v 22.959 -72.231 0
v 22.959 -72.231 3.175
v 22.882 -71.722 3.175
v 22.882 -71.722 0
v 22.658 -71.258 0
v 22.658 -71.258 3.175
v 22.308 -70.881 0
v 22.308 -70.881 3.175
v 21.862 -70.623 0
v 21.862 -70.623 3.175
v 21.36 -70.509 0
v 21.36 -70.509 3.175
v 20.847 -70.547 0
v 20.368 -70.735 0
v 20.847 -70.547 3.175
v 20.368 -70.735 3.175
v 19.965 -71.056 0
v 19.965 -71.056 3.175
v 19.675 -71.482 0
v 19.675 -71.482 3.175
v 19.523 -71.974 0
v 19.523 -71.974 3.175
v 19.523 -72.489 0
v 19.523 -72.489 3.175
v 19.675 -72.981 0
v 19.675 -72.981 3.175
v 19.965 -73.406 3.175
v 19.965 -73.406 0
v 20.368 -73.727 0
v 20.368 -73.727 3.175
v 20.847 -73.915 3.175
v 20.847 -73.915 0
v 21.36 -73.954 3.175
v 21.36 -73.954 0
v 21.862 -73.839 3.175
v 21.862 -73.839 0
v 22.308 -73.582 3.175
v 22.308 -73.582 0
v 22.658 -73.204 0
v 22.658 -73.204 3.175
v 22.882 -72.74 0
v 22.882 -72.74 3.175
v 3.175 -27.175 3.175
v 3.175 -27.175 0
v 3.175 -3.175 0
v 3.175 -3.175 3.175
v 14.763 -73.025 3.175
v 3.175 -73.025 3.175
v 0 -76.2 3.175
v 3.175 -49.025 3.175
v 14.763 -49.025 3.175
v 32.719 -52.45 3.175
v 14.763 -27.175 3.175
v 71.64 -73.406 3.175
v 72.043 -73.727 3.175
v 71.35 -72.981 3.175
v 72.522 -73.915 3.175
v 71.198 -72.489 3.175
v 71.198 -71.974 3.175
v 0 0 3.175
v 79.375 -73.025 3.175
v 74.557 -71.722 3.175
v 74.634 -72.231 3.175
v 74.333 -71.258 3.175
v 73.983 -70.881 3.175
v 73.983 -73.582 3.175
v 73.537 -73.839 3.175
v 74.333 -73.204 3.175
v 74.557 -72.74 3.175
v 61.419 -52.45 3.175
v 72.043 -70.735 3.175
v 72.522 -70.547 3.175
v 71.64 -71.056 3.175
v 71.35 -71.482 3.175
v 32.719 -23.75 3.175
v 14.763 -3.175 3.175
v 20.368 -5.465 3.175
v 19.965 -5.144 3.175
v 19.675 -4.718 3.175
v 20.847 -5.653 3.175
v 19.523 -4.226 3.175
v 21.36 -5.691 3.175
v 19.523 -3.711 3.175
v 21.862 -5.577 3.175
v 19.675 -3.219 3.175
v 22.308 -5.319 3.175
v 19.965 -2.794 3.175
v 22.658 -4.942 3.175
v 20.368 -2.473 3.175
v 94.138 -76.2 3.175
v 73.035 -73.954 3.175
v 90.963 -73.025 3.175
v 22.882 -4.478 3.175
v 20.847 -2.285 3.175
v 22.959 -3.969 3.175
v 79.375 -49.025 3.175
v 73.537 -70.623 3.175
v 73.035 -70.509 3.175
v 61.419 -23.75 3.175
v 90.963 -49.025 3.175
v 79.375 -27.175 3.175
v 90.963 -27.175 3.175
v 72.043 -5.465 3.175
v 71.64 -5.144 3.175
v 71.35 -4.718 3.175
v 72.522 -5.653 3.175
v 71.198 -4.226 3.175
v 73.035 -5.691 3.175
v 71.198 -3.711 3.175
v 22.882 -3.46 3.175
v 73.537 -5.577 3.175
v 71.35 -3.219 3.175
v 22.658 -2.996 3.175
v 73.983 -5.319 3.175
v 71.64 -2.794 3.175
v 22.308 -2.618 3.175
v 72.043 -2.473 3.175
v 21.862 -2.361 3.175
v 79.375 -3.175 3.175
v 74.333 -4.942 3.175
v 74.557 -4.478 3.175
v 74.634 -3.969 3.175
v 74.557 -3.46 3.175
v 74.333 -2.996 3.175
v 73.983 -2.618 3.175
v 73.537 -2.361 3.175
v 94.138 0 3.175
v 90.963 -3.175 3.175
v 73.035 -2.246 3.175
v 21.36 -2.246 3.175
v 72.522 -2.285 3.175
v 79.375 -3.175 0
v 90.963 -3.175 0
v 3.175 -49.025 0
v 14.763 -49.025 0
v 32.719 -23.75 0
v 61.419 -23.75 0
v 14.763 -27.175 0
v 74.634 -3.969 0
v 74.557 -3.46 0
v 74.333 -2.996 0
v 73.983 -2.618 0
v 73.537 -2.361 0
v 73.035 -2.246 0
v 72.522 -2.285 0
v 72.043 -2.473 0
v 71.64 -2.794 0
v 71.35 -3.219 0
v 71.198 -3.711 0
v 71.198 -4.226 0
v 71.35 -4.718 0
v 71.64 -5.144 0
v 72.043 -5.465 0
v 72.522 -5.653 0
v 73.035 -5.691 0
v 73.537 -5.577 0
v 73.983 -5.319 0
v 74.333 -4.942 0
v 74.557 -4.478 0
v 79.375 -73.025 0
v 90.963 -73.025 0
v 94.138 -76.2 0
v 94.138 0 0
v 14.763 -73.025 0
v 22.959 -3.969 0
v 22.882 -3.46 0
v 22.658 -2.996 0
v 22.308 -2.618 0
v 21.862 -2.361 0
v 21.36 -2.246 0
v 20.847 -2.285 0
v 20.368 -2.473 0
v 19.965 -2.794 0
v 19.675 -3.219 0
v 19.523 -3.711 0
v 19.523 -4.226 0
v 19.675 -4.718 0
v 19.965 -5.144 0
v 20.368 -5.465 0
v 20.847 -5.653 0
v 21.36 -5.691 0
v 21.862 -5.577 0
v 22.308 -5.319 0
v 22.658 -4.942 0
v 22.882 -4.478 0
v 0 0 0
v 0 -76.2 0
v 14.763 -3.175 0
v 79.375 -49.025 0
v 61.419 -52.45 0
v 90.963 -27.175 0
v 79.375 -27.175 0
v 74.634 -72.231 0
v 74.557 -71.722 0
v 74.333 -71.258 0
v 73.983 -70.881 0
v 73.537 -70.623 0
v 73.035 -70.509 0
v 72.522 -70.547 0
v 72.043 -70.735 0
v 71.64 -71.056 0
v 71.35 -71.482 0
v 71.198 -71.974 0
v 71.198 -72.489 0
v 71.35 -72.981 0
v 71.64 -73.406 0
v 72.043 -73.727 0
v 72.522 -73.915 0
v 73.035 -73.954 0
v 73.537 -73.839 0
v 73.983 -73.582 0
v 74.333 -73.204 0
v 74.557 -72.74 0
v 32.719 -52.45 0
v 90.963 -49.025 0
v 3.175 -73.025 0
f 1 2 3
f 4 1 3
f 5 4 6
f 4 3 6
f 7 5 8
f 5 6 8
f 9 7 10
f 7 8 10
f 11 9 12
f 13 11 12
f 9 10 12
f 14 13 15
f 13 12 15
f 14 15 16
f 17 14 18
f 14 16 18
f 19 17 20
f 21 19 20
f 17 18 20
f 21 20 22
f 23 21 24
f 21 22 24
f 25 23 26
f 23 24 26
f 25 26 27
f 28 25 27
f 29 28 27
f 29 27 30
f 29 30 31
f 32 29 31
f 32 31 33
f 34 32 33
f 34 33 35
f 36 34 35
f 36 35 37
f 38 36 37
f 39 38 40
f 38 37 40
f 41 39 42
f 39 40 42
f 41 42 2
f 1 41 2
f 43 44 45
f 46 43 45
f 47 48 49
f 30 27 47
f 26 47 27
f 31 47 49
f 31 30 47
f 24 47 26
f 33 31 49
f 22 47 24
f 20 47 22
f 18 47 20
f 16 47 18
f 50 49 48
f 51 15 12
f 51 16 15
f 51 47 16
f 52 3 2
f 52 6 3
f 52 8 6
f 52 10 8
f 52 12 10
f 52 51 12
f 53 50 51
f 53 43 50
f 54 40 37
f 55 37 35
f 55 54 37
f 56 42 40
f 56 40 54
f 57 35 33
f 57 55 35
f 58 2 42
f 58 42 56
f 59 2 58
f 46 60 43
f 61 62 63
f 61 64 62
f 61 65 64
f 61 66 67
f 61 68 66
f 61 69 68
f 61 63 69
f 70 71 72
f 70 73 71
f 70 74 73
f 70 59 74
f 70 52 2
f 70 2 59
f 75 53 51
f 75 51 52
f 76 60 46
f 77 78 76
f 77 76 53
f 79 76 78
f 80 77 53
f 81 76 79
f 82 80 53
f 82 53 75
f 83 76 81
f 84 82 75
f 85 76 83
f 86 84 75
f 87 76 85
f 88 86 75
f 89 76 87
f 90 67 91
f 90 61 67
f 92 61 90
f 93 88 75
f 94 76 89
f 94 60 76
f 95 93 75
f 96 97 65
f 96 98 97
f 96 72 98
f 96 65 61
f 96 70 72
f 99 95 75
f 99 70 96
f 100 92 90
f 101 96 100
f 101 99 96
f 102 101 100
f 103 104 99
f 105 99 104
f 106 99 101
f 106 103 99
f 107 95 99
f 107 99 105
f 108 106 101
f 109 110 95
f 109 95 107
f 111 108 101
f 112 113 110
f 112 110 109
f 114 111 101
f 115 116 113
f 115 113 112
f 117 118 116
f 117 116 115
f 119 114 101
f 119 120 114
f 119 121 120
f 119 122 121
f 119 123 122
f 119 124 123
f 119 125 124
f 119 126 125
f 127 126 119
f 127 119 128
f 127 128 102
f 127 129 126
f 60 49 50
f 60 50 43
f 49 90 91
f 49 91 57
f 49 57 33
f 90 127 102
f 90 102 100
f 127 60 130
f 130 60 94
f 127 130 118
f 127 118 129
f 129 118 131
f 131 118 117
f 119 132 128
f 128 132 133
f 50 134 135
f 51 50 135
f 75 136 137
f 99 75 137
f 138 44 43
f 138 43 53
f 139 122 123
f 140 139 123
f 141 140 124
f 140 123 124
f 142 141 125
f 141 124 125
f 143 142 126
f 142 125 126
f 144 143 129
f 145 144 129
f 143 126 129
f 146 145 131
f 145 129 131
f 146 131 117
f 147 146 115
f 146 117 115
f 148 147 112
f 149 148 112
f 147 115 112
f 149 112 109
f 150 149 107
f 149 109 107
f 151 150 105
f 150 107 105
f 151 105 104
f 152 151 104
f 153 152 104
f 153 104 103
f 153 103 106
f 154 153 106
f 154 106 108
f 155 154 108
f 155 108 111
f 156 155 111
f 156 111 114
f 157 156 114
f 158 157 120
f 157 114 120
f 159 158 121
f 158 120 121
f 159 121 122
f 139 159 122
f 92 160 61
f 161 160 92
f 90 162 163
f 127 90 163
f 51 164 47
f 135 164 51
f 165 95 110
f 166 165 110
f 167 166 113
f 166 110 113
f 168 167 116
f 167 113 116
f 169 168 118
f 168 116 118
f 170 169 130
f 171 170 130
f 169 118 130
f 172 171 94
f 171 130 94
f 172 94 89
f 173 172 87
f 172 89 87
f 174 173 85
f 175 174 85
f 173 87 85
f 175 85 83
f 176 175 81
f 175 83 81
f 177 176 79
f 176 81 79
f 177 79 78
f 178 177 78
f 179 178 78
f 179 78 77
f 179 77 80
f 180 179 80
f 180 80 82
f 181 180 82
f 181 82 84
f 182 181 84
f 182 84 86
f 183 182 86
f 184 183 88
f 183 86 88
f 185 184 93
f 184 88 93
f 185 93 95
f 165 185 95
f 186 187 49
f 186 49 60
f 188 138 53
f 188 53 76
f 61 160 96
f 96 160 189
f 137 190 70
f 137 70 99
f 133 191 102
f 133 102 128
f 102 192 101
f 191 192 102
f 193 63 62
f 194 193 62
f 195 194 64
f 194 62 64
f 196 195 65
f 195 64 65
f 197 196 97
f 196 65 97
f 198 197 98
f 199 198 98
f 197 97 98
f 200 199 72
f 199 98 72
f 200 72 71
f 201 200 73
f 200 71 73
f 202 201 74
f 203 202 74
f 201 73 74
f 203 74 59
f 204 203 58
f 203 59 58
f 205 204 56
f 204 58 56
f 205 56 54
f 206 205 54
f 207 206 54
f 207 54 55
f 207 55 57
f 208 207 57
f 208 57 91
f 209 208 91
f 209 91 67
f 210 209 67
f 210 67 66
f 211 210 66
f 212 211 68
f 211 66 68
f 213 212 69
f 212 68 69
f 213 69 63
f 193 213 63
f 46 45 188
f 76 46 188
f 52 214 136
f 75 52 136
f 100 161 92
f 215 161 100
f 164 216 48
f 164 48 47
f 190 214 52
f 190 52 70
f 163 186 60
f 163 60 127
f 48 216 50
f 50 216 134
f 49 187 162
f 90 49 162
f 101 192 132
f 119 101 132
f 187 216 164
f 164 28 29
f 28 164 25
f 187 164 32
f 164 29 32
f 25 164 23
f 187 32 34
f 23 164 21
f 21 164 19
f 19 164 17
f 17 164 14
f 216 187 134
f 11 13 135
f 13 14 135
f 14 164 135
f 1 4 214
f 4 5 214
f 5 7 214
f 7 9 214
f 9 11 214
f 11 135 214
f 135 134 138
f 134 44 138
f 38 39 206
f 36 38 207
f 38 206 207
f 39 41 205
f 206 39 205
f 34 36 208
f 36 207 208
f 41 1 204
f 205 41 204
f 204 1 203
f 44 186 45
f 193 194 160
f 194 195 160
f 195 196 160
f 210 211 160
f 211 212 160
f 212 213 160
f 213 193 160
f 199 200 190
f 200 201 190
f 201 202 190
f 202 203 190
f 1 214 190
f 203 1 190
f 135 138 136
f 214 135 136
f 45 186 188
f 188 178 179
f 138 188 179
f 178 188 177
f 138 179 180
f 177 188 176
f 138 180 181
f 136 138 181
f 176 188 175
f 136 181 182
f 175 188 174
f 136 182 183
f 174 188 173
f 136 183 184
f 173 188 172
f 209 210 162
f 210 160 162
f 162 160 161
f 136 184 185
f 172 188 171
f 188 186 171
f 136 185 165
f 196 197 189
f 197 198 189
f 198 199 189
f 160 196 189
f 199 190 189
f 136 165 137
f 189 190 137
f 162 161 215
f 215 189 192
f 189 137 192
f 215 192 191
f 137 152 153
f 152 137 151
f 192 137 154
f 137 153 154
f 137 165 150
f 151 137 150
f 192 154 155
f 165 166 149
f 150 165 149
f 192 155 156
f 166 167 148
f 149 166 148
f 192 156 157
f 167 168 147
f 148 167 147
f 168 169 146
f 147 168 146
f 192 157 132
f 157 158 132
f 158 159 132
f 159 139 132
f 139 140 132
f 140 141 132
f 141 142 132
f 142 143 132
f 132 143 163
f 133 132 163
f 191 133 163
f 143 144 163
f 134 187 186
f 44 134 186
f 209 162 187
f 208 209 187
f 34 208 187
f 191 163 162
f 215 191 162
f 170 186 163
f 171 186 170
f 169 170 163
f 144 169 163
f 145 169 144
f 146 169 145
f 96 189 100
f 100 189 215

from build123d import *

# Parameters (mm, degrees)
F0_W     = 94.1376832
F0_H     = 76.2
F0_W_2   = 11.5876832
F0_H_2   = 24
F0_W_3   = 28.6999934
F0_H_3   = 28.6999934
F1_DEPTH = 3.175
F2_R     = 1.7272
F3_DEPTH = 3.175


with BuildPart() as f1:
    # F0 (on Top) → F1 (new body)
    with BuildSketch(Plane.XY):
        with Locations((47.0688416, -38.1)):
            Rectangle(F0_W, F0_H)
        with Locations((8.9688416, -61.025)):
            Rectangle(F0_W_2, F0_H_2, mode=Mode.SUBTRACT)
        with Locations((85.1688416, -61.025)):
            Rectangle(F0_W_2, F0_H_2, mode=Mode.SUBTRACT)
        with Locations((47.0688416, -38.1)):
            Rectangle(F0_W_3, F0_H_3, mode=Mode.SUBTRACT)
        with Locations((8.9688416, -15.175)):
            Rectangle(F0_W_2, F0_H_2, mode=Mode.SUBTRACT)
        with Locations((85.1688416, -15.175)):
            Rectangle(F0_W_2, F0_H_2, mode=Mode.SUBTRACT)
    extrude(amount=F1_DEPTH)

    # F2 (on face) → F3 (cut, through all)
    with BuildSketch(Plane.XY.offset(3.175)):
        with Locations((21.231352, -3.96875)):
            Circle(F2_R)
        with Locations((72.9063312, -3.96875)):
            Circle(F2_R)
        with Locations((72.9063312, -72.23125)):
            Circle(F2_R)
        with Locations((21.231352, -72.23125)):
            Circle(F2_R)
    extrude(amount=-F3_DEPTH, mode=Mode.SUBTRACT)


solid = f1.part
